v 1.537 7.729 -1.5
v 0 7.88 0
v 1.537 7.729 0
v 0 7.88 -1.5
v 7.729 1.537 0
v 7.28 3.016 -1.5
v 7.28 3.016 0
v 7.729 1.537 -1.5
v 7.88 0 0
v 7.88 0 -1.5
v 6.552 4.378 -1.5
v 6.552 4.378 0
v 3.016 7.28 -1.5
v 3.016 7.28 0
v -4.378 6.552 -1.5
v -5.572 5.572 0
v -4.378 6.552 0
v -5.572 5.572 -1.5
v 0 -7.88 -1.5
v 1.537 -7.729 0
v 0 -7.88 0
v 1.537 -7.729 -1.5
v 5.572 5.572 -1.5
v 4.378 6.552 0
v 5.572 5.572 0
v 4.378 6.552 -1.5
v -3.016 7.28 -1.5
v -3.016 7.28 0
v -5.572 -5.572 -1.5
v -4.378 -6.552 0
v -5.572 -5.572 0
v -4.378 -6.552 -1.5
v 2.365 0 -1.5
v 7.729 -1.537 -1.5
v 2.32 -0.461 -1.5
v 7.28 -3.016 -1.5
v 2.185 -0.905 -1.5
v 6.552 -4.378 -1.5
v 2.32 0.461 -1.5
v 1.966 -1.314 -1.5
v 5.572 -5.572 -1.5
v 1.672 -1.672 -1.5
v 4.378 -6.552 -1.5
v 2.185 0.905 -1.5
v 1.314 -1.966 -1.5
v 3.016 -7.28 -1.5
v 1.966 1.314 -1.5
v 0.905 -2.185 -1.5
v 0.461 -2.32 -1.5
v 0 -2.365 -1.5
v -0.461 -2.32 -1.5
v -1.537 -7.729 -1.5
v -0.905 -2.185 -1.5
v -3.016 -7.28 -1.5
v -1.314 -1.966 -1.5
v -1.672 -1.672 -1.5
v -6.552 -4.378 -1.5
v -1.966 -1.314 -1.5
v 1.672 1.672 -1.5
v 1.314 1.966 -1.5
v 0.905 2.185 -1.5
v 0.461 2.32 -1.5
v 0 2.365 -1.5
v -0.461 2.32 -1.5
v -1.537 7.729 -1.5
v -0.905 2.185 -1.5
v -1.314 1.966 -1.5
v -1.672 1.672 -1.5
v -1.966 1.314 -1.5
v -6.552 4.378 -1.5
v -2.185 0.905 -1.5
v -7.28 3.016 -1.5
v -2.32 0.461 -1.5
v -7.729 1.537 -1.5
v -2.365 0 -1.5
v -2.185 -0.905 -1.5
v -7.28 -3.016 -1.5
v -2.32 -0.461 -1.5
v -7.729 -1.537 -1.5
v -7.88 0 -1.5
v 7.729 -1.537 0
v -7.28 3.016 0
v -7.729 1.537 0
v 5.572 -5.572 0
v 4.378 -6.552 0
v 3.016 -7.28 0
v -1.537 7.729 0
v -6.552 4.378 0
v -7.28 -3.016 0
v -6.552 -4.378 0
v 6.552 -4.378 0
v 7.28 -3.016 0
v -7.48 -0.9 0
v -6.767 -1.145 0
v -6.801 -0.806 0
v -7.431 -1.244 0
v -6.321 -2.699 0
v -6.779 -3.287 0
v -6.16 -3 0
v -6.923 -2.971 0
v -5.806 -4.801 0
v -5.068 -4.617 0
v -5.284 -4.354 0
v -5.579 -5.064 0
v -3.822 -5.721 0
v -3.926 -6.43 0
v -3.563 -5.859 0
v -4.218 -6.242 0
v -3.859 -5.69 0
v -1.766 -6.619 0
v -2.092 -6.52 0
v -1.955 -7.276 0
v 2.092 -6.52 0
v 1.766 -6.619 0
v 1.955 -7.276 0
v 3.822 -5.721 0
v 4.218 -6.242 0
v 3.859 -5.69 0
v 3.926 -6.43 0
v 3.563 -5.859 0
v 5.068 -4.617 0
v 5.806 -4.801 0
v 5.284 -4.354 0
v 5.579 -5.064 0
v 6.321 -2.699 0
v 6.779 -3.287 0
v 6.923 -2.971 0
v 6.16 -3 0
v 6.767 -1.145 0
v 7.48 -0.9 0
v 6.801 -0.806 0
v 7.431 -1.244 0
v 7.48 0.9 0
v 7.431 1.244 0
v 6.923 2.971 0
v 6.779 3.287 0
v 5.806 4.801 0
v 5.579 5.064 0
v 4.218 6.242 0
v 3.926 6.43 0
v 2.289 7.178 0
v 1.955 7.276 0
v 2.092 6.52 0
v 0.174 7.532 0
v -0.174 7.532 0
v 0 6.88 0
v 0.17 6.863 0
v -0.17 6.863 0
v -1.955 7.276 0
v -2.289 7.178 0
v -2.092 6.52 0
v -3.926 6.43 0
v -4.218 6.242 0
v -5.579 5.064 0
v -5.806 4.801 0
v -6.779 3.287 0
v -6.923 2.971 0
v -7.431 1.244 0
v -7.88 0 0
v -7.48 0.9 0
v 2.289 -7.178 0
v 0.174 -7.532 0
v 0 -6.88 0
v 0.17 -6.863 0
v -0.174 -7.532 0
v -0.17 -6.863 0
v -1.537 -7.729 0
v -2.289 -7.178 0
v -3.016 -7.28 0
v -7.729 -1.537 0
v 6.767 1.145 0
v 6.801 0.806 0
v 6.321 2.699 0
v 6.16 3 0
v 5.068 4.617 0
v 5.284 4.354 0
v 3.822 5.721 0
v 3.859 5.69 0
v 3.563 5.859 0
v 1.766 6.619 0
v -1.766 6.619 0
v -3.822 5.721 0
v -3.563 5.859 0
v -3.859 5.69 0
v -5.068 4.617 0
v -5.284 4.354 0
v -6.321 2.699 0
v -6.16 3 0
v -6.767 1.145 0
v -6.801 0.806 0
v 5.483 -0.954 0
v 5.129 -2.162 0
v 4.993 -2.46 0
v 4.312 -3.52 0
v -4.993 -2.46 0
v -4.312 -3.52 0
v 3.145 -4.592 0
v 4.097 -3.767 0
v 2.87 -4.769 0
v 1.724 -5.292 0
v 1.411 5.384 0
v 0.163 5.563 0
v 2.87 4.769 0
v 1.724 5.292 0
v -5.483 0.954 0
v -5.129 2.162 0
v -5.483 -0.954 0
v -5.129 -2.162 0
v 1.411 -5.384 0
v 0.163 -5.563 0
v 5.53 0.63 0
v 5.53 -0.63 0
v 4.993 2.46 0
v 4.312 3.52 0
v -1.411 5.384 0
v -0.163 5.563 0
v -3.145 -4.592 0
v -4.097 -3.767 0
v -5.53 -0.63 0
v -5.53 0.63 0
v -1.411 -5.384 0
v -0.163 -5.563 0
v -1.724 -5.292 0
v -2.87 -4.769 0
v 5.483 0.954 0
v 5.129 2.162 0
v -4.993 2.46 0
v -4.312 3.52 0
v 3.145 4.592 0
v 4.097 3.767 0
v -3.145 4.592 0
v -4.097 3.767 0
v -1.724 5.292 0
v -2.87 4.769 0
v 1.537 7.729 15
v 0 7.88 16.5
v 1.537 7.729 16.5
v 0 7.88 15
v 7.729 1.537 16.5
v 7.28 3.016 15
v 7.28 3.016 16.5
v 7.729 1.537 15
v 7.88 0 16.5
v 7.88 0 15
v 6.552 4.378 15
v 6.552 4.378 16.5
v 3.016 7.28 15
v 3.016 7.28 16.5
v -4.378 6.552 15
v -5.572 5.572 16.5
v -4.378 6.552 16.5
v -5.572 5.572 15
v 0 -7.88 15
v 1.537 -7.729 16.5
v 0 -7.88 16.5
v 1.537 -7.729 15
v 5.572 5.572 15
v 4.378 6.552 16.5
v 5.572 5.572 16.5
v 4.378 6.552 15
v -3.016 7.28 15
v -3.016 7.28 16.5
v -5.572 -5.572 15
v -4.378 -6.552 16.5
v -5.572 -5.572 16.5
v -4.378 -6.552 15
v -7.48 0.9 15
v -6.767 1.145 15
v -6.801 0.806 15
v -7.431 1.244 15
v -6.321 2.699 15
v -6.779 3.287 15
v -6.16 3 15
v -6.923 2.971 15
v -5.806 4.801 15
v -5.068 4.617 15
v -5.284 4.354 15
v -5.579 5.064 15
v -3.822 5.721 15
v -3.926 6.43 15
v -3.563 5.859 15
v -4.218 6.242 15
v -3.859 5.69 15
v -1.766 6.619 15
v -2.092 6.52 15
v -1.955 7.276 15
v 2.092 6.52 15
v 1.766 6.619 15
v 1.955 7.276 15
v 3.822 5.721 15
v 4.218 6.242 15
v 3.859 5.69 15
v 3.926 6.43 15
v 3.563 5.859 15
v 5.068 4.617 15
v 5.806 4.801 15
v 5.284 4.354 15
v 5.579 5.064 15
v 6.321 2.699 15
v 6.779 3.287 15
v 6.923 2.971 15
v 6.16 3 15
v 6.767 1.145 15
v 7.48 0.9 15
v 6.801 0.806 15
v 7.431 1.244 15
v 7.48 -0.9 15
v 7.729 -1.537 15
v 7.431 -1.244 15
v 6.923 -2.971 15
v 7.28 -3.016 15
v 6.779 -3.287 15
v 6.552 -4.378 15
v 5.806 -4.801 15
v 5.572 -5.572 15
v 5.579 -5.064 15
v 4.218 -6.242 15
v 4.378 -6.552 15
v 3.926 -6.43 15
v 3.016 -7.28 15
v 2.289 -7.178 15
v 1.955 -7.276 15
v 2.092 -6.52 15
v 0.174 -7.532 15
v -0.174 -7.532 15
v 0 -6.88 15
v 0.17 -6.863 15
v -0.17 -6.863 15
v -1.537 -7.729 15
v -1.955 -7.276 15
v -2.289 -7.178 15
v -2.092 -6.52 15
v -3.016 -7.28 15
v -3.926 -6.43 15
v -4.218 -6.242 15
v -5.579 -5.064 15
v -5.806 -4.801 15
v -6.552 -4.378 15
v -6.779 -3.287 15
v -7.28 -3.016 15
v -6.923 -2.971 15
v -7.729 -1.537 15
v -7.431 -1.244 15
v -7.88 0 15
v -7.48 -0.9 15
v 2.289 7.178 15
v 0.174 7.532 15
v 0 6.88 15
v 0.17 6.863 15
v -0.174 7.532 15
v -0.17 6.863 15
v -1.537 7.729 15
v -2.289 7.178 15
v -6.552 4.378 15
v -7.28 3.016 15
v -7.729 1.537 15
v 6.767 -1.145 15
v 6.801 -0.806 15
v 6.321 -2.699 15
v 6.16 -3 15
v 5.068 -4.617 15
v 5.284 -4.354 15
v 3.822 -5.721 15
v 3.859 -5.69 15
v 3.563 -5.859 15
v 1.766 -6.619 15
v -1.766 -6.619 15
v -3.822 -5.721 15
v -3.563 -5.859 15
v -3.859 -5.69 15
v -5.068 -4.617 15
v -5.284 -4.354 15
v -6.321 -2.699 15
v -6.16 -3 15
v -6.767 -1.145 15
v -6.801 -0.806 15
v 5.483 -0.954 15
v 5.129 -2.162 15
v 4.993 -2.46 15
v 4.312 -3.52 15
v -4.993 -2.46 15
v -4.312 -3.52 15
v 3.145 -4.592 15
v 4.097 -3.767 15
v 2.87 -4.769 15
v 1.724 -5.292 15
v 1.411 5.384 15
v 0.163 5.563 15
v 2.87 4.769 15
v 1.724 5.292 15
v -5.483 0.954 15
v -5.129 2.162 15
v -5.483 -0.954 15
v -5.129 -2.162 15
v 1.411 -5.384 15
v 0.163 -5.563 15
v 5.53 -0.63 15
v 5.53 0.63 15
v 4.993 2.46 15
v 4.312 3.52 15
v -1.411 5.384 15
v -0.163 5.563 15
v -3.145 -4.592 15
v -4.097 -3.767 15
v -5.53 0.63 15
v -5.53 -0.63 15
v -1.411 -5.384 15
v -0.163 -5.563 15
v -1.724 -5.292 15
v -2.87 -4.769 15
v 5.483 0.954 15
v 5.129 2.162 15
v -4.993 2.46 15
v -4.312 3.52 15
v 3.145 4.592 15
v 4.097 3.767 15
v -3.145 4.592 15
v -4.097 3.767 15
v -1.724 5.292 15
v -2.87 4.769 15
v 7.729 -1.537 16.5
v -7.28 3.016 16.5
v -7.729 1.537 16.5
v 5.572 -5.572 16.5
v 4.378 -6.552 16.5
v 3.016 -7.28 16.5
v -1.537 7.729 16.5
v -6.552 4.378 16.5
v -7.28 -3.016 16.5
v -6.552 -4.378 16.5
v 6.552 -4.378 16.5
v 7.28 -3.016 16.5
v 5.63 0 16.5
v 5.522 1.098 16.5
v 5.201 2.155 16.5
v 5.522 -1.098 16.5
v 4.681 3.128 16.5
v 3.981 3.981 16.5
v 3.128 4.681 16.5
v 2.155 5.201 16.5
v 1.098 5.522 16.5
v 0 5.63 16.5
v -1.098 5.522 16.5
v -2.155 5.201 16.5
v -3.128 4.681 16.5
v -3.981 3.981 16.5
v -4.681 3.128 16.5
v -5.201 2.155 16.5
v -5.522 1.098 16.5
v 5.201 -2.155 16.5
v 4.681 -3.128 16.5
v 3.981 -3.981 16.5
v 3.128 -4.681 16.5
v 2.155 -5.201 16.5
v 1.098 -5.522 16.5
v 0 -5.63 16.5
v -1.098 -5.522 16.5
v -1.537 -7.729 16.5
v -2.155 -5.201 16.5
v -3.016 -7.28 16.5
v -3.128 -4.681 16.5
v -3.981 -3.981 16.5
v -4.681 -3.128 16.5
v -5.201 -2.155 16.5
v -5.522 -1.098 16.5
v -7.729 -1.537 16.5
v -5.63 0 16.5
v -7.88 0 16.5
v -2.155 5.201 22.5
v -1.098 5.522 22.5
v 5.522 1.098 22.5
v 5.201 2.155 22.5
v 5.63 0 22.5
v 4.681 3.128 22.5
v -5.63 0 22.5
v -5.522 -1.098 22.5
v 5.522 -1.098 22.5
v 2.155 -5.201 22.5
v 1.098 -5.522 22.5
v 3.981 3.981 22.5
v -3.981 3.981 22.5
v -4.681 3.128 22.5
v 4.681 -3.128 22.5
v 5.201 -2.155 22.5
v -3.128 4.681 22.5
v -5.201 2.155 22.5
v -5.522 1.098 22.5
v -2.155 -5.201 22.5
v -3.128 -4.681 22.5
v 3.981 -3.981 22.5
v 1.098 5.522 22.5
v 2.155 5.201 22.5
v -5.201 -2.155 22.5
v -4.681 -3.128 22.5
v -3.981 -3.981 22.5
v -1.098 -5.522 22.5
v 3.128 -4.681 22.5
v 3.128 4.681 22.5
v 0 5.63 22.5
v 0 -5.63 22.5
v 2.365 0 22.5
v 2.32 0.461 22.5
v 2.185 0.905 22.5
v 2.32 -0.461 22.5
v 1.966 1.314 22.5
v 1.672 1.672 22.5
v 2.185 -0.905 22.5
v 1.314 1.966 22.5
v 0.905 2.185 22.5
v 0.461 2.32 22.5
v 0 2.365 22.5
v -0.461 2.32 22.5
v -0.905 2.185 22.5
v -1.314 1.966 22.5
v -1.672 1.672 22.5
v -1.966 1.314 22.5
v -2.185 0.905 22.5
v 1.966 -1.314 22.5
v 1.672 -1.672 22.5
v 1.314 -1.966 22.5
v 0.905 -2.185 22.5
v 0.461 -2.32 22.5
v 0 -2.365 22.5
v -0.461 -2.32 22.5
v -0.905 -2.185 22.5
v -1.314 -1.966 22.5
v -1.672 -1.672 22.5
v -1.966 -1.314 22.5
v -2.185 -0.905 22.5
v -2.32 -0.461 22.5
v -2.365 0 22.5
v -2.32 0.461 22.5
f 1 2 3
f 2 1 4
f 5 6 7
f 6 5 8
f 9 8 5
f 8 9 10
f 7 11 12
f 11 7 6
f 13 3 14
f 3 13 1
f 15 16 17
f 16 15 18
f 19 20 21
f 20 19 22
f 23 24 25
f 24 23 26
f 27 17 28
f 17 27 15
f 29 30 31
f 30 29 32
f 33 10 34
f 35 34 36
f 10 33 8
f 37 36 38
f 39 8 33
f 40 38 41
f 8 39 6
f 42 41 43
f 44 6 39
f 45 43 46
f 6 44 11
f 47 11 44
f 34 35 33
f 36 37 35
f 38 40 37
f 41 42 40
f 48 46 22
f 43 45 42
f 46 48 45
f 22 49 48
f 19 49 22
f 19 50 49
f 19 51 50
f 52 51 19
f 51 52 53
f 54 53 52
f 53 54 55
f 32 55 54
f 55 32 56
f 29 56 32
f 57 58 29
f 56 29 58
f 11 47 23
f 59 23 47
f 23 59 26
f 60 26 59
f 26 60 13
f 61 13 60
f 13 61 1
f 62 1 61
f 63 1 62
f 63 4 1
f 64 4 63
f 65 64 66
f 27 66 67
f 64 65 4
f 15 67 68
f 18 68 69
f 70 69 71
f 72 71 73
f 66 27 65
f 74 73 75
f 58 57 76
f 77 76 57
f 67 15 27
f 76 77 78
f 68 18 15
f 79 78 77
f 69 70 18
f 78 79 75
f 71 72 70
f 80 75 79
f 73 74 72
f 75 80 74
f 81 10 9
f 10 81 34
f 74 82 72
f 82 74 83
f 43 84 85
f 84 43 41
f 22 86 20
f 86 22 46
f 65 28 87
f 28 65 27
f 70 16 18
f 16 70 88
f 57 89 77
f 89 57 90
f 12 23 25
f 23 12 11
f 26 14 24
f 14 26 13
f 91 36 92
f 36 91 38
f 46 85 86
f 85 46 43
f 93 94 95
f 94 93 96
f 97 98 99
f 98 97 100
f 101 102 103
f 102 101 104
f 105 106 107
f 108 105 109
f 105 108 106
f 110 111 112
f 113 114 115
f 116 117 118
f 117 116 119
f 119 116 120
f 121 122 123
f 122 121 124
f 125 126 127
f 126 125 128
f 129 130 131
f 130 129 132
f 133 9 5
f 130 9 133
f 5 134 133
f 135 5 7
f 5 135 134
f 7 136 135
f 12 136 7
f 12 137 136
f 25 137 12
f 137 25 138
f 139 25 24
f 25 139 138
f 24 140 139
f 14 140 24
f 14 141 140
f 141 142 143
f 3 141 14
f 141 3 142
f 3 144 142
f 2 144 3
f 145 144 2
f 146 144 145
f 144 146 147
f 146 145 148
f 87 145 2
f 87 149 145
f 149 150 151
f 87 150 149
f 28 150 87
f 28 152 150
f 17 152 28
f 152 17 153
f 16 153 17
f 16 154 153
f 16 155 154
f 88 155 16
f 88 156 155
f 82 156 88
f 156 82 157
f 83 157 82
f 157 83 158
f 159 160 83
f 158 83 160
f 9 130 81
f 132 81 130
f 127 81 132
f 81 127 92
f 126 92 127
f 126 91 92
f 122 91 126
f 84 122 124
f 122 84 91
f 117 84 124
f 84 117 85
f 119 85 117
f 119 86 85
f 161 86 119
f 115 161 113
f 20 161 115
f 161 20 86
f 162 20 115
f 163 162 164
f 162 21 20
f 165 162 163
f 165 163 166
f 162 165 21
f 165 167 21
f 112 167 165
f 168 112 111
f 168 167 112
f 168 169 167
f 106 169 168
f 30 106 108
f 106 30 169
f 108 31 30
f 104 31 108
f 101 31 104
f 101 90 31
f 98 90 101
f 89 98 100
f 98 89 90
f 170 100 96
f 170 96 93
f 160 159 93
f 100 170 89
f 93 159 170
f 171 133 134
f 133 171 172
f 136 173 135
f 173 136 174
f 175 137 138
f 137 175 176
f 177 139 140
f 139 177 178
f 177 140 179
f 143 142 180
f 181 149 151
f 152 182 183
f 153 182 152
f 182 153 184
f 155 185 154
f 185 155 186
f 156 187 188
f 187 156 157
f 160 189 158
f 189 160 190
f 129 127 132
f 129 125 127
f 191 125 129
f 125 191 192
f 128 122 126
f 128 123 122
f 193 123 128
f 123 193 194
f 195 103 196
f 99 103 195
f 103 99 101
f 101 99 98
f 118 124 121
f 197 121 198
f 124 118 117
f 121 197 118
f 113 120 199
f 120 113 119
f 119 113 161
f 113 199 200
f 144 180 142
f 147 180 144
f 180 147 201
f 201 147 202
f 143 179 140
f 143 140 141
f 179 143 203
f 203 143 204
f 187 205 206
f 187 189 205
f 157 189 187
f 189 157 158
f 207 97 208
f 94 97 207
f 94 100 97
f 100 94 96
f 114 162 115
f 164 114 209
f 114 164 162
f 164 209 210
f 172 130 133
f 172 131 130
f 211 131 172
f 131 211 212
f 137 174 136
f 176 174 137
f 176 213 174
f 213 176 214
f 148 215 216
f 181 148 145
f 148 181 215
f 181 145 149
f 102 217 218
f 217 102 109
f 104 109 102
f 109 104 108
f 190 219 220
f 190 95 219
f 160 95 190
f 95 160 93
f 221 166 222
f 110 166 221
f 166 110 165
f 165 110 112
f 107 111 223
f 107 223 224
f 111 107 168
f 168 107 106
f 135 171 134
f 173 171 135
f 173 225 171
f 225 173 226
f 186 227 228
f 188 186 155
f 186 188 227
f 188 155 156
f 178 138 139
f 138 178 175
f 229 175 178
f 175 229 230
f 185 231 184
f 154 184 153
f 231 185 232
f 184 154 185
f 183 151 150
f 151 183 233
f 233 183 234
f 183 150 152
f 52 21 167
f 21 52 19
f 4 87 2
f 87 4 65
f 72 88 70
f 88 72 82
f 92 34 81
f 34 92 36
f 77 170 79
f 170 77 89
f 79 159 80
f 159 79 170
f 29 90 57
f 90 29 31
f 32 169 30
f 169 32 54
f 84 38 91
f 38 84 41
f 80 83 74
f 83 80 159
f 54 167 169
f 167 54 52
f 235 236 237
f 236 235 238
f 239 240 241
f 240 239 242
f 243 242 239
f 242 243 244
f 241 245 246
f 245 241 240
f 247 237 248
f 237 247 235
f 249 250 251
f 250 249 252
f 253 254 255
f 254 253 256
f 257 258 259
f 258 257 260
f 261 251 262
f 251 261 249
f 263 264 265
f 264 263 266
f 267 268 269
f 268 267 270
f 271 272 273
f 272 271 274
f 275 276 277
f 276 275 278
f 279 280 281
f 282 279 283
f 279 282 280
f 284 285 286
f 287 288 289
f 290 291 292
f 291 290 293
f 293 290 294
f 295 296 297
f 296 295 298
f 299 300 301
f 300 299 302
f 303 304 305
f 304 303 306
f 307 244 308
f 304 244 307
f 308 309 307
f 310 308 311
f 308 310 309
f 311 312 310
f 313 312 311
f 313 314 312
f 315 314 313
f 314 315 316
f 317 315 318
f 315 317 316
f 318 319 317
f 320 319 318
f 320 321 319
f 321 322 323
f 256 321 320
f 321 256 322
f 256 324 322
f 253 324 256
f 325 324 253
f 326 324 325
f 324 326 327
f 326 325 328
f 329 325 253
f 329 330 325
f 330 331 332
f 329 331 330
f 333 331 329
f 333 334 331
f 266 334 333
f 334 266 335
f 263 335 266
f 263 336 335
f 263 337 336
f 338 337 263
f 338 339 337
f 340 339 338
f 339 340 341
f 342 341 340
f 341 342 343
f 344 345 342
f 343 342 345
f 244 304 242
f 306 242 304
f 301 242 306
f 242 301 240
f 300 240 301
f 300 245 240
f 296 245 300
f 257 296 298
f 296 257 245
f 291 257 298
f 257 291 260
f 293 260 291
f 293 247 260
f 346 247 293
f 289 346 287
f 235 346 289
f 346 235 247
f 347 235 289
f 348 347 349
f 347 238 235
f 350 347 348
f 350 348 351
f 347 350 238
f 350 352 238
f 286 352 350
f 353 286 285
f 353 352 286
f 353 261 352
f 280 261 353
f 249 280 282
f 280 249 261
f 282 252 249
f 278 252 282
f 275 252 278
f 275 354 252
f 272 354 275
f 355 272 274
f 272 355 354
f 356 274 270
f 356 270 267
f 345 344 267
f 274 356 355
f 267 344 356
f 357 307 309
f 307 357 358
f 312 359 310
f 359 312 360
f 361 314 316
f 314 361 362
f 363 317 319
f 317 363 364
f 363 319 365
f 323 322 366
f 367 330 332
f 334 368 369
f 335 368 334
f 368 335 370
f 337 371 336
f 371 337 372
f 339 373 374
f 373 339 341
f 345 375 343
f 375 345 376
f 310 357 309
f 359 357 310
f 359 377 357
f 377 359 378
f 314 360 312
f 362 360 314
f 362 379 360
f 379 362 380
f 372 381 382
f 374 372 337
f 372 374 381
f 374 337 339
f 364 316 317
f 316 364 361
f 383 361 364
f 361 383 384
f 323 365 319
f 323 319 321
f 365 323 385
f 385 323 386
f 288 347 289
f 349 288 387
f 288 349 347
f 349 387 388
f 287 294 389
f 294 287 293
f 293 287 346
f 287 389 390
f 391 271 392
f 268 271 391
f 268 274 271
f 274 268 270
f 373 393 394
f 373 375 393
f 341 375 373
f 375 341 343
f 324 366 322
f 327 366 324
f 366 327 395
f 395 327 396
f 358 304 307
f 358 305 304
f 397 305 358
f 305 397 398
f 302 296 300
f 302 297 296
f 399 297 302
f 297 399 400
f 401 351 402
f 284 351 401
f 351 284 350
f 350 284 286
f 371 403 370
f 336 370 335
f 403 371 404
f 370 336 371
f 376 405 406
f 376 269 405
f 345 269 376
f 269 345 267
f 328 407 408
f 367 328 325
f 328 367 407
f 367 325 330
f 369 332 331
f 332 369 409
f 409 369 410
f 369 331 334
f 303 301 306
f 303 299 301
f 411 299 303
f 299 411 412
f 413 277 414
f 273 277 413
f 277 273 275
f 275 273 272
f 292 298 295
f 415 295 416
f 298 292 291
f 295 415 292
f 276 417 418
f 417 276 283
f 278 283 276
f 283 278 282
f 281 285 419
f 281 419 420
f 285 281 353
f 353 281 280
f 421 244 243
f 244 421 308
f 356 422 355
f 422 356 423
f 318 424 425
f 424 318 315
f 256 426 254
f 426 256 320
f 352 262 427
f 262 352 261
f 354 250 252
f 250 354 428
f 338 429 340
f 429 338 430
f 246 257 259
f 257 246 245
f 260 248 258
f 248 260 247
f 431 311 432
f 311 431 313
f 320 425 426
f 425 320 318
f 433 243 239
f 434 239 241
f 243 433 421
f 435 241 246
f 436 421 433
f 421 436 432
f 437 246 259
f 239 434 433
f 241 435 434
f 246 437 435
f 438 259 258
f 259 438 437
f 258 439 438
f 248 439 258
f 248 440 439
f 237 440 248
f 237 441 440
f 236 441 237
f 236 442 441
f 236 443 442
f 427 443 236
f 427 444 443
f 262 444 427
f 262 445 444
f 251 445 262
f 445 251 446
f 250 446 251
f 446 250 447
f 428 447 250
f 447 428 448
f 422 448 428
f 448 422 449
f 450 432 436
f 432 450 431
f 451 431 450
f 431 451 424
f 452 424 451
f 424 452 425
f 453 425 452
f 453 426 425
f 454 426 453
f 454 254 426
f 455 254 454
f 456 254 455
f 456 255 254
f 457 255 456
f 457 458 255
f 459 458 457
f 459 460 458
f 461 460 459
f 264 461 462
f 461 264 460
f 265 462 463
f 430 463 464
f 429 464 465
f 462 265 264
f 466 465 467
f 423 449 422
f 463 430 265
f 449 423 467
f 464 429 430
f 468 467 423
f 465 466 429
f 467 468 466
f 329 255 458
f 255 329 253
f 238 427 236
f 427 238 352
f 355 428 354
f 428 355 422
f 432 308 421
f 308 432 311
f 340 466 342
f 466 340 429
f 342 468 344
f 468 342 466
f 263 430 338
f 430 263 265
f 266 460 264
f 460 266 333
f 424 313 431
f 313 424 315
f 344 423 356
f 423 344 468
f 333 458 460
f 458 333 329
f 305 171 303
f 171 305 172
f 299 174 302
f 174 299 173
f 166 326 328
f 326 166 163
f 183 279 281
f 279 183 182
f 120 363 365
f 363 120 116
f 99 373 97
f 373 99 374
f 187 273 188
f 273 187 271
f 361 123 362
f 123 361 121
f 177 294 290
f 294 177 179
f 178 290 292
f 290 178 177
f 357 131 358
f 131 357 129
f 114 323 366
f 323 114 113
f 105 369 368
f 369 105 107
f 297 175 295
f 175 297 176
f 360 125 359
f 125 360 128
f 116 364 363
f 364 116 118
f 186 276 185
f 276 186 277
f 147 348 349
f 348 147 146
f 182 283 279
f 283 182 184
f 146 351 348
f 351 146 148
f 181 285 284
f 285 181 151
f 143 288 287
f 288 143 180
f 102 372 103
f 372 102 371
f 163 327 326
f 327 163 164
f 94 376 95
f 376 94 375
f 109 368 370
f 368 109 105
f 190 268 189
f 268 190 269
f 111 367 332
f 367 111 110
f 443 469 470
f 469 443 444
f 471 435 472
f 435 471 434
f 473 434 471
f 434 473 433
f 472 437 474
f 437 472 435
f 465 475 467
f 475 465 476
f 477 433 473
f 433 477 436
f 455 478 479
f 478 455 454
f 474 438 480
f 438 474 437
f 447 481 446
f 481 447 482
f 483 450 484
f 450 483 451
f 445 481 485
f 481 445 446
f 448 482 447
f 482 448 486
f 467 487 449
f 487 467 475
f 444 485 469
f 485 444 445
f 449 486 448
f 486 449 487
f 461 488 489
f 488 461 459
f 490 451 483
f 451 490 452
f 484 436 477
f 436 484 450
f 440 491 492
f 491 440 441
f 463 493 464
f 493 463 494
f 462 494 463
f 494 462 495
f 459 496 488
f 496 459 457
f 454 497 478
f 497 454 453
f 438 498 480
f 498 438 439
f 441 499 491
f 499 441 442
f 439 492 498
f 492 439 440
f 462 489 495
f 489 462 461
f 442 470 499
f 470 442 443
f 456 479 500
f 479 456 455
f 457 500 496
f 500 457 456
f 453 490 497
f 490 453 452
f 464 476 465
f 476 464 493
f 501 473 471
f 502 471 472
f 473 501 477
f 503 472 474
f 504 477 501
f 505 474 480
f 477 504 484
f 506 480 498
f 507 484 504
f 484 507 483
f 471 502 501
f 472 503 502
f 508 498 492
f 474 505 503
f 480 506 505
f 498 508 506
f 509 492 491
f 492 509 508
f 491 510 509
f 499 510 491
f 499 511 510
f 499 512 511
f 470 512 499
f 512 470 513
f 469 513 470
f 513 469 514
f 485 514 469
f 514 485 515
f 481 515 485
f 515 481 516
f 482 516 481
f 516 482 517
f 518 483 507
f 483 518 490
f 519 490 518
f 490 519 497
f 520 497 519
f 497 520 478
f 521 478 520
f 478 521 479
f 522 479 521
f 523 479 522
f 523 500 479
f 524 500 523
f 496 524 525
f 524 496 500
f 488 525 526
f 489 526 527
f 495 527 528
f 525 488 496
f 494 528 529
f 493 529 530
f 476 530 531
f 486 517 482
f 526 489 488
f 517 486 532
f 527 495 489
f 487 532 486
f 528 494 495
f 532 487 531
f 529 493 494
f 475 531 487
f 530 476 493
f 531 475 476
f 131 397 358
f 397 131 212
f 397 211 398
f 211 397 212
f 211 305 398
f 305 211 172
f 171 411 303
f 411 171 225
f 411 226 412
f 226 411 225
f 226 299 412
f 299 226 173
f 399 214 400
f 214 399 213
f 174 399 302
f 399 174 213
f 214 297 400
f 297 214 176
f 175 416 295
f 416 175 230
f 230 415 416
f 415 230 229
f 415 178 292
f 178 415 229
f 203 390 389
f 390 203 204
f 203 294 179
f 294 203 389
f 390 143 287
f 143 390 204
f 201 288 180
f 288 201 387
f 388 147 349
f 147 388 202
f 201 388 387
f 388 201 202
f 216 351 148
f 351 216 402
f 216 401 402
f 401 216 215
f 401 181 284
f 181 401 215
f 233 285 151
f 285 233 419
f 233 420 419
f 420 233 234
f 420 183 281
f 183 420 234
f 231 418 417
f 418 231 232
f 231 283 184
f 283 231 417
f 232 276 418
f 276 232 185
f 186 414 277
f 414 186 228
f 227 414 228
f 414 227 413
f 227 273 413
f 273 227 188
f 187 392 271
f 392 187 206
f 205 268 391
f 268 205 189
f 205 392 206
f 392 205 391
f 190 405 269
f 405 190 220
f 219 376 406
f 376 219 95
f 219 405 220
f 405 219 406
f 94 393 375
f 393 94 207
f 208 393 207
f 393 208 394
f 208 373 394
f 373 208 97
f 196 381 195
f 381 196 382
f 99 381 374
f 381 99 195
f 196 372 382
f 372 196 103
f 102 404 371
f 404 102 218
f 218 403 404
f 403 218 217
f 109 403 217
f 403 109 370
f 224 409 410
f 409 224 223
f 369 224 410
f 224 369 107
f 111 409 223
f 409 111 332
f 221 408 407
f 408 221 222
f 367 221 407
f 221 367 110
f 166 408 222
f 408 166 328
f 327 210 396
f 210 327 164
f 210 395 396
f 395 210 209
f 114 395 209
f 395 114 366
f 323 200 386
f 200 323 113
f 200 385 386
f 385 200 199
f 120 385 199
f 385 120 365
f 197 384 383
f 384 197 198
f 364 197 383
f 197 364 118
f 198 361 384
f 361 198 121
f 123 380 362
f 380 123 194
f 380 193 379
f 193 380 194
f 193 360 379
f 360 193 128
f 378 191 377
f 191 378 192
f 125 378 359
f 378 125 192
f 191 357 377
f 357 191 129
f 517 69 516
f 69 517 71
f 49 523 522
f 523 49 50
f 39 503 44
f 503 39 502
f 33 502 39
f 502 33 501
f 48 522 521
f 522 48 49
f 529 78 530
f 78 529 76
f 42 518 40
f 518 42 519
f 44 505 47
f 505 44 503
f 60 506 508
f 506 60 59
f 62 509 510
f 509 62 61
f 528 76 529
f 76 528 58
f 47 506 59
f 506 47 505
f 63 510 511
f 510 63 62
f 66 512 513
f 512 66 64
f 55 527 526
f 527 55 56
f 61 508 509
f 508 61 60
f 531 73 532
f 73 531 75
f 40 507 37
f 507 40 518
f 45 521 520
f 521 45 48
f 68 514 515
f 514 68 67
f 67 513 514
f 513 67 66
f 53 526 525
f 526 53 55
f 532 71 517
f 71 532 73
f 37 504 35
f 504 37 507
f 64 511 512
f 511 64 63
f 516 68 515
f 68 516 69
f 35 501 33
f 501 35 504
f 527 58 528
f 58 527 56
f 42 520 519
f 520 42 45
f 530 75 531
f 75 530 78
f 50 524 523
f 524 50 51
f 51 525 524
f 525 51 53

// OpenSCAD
$fn = 32;

// ----------------------------------------------------------------------
// Timing pulley: GT2 22T, pitch 2 mm, 15.76 mm x 24 mm
// ----------------------------------------------------------------------

// --- parameters (mm) ---
pitch_mm = 2;             // belt pitch
tooth_count = 22;         // number of grooves
width = 15;               // belt width between the flanges
tip_d = 13.76;            // tip circle diameter
root_d = 12.26;           // groove bottom diameter
groove_h = 0.75;          // groove depth
tooth_w = 1.5;            // groove width at the tip circle
side_d = 15.76;           // flange diameter
side_t = 1.5;             // flange thickness
spigot_d = 10.66;         // flange spigot, sunk into the rim
spigot_h = 1.2;           // spigot depth into the rim
hub_bore = 4.73;          // shaft bore
hub_d = 11.26;            // hub diameter
hub_h = 6;                // hub above the flange
bottom_z = -1.5;          // lowest point of the pulley
top_z = 22.5;             // highest point of the pulley

module rim() {
  cylinder(h = width, d = tip_d);
}

module groove_cutter() {
  /* belt tooth groove: deeper than wide, cut through the belt width */
  translate([root_d / 2, 0, 0])
    linear_extrude(height = width)
      polygon(points = [[-0.6, -tooth_w * 0.42], [groove_h + 0.6, -tooth_w * 0.6],
                        [groove_h + 0.6, tooth_w * 0.6], [-0.6, tooth_w * 0.42]]);
}

module flanges() {
  translate([0, 0, -side_t]) cylinder(h = side_t, d = side_d);
  translate([0, 0, width]) cylinder(h = side_t, d = side_d);
  translate([0, 0, -spigot_h]) cylinder(h = spigot_h + 0.6, d = spigot_d);
  translate([0, 0, width - 0.6]) cylinder(h = spigot_h + 0.6, d = spigot_d);
}

module hub() {
  translate([0, 0, bottom_z]) cylinder(h = top_z - bottom_z, d = hub_d);
}

difference() {
  union() {
    rim();
    hub();
    flanges();
  }
  for (i = [0 : tooth_count - 1]) rotate([0, 0, i * 360 / tooth_count]) groove_cutter();
  translate([0, 0, bottom_z - 1]) cylinder(h = top_z - bottom_z + 2, d = hub_bore);
}
